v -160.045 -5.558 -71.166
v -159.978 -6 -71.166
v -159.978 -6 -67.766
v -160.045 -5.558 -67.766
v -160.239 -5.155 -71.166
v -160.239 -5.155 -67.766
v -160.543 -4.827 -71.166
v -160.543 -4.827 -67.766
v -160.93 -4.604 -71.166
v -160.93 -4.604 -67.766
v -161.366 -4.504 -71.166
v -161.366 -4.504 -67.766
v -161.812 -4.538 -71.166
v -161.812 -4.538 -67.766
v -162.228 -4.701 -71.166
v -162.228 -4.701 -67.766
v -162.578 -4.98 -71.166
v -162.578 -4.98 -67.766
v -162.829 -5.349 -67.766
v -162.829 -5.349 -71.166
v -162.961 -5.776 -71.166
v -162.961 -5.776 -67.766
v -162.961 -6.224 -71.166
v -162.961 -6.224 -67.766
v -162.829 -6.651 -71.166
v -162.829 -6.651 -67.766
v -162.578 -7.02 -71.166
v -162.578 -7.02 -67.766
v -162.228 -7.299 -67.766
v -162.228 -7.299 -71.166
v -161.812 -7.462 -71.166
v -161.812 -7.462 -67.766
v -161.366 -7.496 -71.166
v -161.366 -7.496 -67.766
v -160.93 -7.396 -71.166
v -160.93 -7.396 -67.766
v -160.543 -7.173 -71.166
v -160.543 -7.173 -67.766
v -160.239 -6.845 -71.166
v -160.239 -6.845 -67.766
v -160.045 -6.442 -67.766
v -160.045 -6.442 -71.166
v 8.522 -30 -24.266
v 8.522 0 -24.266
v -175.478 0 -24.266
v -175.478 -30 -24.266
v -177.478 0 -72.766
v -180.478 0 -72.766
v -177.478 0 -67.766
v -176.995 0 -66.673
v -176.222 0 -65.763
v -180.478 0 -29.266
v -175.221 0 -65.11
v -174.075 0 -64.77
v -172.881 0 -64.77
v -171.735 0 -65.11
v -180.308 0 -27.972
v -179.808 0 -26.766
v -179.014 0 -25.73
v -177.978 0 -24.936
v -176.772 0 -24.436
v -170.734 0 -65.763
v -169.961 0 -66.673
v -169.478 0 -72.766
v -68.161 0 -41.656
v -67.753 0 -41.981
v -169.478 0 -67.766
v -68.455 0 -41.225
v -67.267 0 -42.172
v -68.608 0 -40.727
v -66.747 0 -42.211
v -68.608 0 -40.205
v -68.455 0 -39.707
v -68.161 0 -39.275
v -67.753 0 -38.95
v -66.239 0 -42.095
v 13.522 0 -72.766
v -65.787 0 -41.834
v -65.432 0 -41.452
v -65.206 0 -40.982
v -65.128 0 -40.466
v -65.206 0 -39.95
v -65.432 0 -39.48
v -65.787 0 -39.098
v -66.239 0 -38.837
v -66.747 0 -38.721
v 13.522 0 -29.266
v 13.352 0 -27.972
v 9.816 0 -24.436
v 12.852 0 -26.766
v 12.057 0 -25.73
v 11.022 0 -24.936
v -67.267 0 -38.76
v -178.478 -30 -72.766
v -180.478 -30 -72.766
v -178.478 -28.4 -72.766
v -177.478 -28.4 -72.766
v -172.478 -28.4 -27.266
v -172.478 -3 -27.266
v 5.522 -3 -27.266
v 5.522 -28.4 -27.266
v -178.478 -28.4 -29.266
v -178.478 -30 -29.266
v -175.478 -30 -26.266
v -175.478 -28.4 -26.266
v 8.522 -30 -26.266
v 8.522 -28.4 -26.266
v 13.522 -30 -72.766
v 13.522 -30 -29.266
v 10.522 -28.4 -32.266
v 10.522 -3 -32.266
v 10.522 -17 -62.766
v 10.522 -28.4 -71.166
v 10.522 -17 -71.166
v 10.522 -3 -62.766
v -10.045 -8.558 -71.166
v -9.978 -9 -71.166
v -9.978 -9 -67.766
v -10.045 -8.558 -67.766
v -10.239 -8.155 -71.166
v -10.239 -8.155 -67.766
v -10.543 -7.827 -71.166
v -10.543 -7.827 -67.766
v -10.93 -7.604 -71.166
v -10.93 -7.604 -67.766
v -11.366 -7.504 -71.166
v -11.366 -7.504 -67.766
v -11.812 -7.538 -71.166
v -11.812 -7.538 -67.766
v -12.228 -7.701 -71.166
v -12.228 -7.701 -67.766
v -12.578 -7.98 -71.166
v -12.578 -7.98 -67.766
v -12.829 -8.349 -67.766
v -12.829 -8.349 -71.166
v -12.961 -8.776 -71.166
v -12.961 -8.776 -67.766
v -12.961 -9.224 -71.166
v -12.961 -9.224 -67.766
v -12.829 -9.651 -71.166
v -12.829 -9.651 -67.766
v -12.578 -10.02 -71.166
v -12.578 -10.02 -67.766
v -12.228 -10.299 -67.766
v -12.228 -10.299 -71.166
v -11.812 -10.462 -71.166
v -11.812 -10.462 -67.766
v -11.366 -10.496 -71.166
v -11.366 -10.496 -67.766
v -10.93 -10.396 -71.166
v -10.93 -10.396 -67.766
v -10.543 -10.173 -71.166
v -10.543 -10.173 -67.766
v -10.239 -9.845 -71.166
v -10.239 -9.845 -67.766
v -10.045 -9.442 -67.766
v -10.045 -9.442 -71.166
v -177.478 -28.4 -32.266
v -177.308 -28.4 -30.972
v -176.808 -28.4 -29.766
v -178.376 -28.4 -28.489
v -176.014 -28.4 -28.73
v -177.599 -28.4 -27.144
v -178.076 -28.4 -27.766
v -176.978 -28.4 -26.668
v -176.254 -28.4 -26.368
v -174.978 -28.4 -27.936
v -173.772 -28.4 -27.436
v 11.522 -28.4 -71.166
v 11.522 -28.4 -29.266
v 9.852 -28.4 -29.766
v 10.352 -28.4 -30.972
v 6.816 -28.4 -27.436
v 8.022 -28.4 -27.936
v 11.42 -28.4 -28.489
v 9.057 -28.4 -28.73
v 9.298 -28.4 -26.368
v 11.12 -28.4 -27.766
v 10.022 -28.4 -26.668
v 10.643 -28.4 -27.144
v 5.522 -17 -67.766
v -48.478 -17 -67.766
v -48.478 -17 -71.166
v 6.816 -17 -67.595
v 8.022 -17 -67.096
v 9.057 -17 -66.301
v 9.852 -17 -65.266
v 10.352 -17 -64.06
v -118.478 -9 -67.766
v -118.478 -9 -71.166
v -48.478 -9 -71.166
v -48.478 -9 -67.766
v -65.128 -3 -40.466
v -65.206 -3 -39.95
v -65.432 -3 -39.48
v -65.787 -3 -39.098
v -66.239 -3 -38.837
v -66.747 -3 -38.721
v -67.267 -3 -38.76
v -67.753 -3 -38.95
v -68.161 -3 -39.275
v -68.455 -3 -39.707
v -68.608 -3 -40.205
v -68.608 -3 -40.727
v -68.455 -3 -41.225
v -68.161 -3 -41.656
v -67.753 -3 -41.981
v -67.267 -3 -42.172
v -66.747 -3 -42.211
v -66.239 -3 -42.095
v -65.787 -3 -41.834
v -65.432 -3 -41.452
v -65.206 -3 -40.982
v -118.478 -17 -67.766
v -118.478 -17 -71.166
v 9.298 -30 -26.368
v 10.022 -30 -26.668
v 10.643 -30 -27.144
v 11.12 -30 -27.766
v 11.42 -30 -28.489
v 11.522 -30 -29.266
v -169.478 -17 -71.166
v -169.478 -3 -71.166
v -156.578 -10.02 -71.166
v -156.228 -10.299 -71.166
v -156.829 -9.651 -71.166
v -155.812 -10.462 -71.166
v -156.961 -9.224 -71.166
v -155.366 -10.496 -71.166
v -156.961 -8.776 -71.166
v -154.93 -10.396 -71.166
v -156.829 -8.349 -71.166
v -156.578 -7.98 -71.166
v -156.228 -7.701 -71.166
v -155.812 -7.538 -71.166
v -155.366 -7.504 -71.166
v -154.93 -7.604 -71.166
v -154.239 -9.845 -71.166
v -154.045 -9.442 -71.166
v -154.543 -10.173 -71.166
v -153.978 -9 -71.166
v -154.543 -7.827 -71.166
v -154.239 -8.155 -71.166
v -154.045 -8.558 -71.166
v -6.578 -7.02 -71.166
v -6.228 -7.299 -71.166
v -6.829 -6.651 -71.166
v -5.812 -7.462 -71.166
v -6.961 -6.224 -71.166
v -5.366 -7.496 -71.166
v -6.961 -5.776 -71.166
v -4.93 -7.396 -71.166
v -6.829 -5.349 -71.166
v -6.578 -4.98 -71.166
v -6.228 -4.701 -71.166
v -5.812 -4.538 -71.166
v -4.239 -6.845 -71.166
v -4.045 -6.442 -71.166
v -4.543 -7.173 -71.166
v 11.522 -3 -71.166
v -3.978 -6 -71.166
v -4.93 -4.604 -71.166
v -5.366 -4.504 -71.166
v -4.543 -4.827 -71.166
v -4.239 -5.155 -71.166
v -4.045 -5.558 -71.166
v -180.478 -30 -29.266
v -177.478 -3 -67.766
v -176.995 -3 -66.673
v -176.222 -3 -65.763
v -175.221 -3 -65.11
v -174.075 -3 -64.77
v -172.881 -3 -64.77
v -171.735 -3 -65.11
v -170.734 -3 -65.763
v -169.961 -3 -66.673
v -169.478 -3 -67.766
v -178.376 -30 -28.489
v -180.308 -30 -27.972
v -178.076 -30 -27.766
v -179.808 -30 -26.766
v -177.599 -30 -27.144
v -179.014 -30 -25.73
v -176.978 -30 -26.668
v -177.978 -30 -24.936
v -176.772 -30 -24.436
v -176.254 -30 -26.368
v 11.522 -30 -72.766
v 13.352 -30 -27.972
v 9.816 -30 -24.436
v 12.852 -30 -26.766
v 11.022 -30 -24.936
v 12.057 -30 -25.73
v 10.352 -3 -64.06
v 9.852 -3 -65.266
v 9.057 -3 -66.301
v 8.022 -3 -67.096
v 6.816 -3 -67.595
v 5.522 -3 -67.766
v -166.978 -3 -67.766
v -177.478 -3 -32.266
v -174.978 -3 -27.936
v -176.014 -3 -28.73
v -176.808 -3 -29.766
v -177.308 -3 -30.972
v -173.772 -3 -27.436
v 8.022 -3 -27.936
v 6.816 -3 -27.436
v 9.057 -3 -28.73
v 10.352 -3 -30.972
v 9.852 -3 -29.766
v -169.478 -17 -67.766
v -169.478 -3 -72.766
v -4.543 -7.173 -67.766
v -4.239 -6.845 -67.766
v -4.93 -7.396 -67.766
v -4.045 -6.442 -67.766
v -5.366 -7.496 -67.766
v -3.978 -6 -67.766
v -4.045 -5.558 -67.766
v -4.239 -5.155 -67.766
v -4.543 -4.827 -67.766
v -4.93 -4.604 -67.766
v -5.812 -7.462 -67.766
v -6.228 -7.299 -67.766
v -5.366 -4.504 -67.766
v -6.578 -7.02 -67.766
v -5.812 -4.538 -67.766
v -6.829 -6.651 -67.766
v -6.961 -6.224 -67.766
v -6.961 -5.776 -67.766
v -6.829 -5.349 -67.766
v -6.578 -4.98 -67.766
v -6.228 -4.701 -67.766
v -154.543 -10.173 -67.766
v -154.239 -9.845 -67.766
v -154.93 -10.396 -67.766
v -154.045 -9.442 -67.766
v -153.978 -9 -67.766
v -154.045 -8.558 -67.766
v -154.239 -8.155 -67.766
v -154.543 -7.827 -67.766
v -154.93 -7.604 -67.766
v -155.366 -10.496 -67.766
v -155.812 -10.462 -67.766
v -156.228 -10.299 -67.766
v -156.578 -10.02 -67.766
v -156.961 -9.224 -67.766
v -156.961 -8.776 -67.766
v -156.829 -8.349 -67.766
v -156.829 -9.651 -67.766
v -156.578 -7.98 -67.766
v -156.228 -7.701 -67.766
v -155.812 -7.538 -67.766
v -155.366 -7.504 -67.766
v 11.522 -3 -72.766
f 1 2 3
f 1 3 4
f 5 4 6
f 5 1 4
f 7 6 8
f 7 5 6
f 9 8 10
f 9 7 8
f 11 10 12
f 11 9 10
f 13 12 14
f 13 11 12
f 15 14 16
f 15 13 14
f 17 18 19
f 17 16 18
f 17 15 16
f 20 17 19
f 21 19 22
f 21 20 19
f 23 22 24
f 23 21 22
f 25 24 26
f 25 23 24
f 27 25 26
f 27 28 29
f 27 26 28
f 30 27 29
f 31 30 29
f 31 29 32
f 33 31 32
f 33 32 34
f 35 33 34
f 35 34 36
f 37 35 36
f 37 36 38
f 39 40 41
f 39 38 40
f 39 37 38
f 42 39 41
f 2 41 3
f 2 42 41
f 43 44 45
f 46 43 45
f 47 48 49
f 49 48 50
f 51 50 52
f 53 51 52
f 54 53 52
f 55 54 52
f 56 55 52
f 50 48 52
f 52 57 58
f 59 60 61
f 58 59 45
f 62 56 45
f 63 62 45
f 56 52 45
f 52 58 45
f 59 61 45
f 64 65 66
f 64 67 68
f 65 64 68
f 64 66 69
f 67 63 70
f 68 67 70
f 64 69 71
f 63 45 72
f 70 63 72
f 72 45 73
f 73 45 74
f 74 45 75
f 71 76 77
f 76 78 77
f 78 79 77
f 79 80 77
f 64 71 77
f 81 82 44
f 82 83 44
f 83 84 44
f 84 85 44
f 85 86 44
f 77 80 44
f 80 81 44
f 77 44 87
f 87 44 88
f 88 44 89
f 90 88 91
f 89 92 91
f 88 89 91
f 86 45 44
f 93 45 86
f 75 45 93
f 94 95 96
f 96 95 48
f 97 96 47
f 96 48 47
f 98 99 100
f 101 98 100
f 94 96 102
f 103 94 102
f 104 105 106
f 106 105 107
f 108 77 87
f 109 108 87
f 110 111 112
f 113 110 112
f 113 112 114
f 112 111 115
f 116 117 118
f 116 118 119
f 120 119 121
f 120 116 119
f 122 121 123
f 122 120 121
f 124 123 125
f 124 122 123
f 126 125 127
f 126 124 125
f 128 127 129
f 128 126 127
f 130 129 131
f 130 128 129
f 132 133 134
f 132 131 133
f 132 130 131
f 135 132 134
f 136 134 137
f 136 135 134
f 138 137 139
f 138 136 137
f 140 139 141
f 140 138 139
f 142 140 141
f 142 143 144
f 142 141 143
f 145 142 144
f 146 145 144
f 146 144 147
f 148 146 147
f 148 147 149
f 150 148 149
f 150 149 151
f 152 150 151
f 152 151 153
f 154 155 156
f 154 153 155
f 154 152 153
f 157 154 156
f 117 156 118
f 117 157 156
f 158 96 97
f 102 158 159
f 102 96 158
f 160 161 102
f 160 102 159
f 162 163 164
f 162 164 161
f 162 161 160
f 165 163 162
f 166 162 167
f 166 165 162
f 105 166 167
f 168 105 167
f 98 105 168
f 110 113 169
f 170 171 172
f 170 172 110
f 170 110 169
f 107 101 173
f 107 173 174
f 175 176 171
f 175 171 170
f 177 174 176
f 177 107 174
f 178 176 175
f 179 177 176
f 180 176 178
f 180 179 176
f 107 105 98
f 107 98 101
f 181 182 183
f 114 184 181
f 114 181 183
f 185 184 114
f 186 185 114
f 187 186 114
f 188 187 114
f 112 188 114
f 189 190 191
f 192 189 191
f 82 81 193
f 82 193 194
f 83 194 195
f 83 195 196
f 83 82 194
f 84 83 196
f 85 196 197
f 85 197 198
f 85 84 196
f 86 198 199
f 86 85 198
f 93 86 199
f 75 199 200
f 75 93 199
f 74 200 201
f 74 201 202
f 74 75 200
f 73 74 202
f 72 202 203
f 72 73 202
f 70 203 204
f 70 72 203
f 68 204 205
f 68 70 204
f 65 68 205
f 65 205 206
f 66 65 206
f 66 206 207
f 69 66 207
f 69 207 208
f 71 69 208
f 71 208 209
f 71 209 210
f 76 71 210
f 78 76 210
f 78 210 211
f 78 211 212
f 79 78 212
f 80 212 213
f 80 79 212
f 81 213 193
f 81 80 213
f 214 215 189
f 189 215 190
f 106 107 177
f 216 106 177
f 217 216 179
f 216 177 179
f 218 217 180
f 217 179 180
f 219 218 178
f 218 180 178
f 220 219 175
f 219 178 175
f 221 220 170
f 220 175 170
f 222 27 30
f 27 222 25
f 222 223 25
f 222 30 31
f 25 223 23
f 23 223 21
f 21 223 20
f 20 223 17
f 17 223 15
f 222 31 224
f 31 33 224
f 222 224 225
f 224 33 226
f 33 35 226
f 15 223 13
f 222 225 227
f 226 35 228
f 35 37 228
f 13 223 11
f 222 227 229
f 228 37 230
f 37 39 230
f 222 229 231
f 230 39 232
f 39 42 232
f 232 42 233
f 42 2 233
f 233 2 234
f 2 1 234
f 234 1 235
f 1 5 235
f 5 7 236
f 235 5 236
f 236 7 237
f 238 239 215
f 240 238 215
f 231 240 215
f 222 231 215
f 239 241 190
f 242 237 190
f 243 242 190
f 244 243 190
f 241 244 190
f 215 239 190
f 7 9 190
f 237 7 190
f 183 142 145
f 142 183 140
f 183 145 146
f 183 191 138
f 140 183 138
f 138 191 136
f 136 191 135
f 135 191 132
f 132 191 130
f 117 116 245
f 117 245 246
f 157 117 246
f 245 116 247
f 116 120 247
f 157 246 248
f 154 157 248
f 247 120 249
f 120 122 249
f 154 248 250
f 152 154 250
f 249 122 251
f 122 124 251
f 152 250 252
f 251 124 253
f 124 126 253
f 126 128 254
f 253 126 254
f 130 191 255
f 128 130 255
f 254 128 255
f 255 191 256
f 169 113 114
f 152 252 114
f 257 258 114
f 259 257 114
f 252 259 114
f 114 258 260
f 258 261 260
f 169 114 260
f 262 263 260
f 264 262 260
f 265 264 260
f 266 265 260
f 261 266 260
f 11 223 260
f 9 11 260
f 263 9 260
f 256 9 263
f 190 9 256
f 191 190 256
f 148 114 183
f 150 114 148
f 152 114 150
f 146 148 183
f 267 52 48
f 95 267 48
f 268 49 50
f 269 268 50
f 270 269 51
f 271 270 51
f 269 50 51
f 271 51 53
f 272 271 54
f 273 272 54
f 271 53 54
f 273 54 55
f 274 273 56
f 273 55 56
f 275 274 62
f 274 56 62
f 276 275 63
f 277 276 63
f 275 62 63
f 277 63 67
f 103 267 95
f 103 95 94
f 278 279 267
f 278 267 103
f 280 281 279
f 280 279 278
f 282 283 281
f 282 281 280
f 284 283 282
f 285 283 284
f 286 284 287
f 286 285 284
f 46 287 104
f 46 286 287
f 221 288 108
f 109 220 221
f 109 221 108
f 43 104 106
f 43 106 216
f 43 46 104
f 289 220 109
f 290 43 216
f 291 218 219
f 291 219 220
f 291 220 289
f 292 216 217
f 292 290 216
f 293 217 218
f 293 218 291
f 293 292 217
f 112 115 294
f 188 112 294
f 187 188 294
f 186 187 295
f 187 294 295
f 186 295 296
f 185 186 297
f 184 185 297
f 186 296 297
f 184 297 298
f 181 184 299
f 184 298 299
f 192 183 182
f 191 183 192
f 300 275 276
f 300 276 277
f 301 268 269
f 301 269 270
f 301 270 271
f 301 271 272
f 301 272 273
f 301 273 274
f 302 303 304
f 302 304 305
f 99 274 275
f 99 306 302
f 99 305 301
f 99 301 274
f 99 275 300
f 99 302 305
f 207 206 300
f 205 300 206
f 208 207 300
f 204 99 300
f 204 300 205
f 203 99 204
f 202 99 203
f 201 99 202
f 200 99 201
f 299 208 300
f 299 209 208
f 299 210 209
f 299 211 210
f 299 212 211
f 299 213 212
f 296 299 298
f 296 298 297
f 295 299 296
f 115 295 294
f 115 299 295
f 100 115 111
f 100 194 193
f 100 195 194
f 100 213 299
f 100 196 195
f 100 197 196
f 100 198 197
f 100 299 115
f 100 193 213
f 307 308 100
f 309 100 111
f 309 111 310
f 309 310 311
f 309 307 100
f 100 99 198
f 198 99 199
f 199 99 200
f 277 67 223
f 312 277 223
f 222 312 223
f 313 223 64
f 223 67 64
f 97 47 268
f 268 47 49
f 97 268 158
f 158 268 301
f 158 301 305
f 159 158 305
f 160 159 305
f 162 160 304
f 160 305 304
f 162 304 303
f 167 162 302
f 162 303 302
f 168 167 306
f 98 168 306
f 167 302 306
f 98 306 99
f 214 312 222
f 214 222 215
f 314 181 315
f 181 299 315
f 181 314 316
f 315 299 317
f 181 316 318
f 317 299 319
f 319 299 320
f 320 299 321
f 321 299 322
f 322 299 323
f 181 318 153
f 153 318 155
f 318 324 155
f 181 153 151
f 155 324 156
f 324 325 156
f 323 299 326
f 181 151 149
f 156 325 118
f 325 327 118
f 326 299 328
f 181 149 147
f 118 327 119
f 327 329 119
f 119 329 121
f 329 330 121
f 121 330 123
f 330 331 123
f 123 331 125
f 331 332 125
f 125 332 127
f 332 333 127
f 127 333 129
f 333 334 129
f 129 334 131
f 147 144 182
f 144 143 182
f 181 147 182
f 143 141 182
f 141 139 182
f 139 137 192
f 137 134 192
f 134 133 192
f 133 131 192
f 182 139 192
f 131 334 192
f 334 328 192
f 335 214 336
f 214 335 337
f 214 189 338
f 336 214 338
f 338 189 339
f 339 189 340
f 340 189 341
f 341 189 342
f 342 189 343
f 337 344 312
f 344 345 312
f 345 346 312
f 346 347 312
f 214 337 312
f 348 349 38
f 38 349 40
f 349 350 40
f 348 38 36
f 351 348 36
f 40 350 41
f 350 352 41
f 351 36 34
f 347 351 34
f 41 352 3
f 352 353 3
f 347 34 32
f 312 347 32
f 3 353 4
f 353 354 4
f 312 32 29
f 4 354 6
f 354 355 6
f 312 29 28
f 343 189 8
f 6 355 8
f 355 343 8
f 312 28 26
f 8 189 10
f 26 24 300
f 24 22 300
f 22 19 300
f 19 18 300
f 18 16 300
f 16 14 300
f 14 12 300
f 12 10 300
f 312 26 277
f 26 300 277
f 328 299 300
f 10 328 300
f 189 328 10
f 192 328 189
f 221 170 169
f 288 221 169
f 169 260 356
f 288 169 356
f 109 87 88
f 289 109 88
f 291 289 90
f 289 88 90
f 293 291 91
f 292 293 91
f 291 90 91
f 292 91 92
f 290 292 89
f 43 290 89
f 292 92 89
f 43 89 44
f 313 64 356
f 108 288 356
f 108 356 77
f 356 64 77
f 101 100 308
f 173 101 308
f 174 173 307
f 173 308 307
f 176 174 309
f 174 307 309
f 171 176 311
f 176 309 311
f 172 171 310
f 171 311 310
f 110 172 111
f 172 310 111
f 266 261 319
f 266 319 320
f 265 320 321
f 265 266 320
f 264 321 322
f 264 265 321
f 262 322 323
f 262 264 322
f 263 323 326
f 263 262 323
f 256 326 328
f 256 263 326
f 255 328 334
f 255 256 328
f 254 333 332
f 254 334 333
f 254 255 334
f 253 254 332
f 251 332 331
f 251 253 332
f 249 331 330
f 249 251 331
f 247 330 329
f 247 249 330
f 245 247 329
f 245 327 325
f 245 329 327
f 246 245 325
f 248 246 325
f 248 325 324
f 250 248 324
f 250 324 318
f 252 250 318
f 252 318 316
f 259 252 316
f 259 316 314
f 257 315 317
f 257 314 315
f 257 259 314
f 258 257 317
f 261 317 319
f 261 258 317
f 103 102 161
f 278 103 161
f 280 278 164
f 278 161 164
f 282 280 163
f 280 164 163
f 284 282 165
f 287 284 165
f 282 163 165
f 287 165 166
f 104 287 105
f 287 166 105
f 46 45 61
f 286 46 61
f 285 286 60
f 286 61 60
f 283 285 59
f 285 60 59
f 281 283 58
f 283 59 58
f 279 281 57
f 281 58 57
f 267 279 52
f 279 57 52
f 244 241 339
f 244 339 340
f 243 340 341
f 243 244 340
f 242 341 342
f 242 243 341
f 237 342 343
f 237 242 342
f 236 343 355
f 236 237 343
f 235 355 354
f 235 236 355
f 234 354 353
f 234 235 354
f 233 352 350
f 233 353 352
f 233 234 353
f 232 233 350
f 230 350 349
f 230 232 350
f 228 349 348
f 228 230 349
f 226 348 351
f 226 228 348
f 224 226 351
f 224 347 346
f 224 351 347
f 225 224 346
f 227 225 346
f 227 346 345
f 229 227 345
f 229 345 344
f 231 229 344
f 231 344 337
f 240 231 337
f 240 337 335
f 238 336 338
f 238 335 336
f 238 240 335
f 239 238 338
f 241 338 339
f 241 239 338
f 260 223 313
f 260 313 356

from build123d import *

# Parameters (mm, degrees)
F1_DEPTH = 30
F2_DEPTH = 28.4
F0_W     = 2.5
F0_H     = 3.4
F0_W_2   = 3
F0_W_3   = 7
F0_W_4   = 35.5
F0_W_5   = 70
F3_DEPTH = 17
F0_R     = 1.75
F4_DEPTH = 3
F6_DEPTH = 25
F7_R     = 1.5
F7_W     = 70
F7_H     = 13.8912867606
F8_DEPTH = 25


# Not quite as in the source:
# - ends of sketch curves that miss each other by under 0.0002 mm in the source are joined


with BuildPart() as f1:
    # F0 (on Front) → F1 (new body)
    with BuildSketch(Plane.XZ):
        with BuildLine():
            Line((-180.478038, -29.2658), (-180.478038, -72.7658))
            Line((-180.478038, -72.7658), (-178.478038, -72.7658))
            Line((-178.478038, -72.7658), (-178.478038, -29.2658))
            ThreePointArc((-178.478038, -29.2658), (-177.5993583436, -27.1444796564), (-175.478038, -26.2658))
            Line((-175.478038, -26.2658), (8.521962, -26.2658))
            ThreePointArc((8.521962, -26.2658), (10.6432823436, -27.1444796564), (11.521962, -29.2658))
            Line((11.521962, -29.2658), (11.521962, -71.1658))
            Line((11.521962, -71.1658), (11.521962, -72.7658))
            Line((11.521962, -72.7658), (13.521962, -72.7658))
            Line((13.521962, -72.7658), (13.521962, -29.2658))
            ThreePointArc((13.521962, -29.2658), (12.0574959059, -25.7302660941), (8.521962, -24.2658))
            Line((8.521962, -24.2658), (-175.478038, -24.2658))
            ThreePointArc((-175.478038, -24.2658), (-179.0135719059, -25.7302660941), (-180.478038, -29.2658))
        make_face()
    extrude(amount=F1_DEPTH)

    # F0 (on Front) → F2 (join)
    with BuildSketch(Plane.XZ):
        with BuildLine():
            Line((-178.478038, -29.2658), (-178.478038, -72.7658))
            Line((-178.478038, -72.7658), (-177.478038, -72.7658))
            Line((-177.478038, -72.7658), (-177.478038, -67.7658000352))
            Line((-177.478038, -67.7658000352), (-177.478038, -32.2658))
            ThreePointArc((-177.478038, -32.2658), (-176.0135719059, -28.7302660941), (-172.478038, -27.2658))
            Line((-172.478038, -27.2658), (5.521962, -27.2658))
            ThreePointArc((5.521962, -27.2658), (9.0574959059, -28.7302660941), (10.521962, -32.2658))
            Line((10.521962, -32.2658), (10.521962, -62.7658))
            Line((10.521962, -62.7658), (10.521962, -71.1658))
            Line((10.521962, -71.1658), (11.521962, -71.1658))
            Line((11.521962, -71.1658), (11.521962, -29.2658))
            ThreePointArc((11.521962, -29.2658), (10.6432823436, -27.1444796564), (8.521962, -26.2658))
            Line((8.521962, -26.2658), (-175.478038, -26.2658))
            ThreePointArc((-175.478038, -26.2658), (-177.5993583436, -27.1444796564), (-178.478038, -29.2658))
        make_face()
    extrude(amount=F2_DEPTH)

    # F0 (on Front) → F3 (join)
    with BuildSketch(Plane.XZ):
        with Locations((-168.228038, -69.4658)):
            Rectangle(F0_W, F0_H)
        with Locations((-165.478038, -69.4658)):
            Rectangle(F0_W_2, F0_H)
        with Locations((-160.478038, -69.4658)):
            Rectangle(F0_W_3, F0_H)
        with Locations((-155.478038, -69.4658)):
            Rectangle(F0_W_2, F0_H)
        with Locations((-136.228038, -69.4658)):
            Rectangle(F0_W_4, F0_H)
        with Locations((-83.478038, -69.4658)):
            Rectangle(F0_W_5, F0_H)
        with Locations((-30.728038, -69.4658)):
            Rectangle(F0_W_4, F0_H)
        with Locations((-11.478038, -69.4658)):
            Rectangle(F0_W_2, F0_H)
        with Locations((-6.478038, -69.4658)):
            Rectangle(F0_W_3, F0_H)
        with Locations((-1.478038, -69.4658)):
            Rectangle(F0_W_2, F0_H)
        with BuildLine():
            Line((0.021962, -71.1658), (10.521962, -71.1658))
            Line((10.521962, -71.1658), (10.521962, -62.7658))
            ThreePointArc((10.521962, -62.7658), (9.0574959059, -66.3013339059), (5.521962, -67.7658))
            Line((5.521962, -67.7658), (0.021962, -67.7658))
            Line((0.021962, -67.7658), (0.021962, -71.1658))
        make_face()
    extrude(amount=F3_DEPTH)

    # F0 (on Front) → F4 (join)
    with BuildSketch(Plane.XZ):
        Polygon((-166.978038, -71.1658), (-169.478038, -71.1658), (-169.478038, -72.7658), (11.521962, -72.7658), (11.521962, -71.1658), (10.521962, -71.1658), (0.021962, -71.1658), (-2.978038, -71.1658), (-9.978038, -71.1658), (-12.978038, -71.1658), (-48.478038, -71.1658), (-118.478038, -71.1658), (-153.978038, -71.1658), (-156.978038, -71.1658), (-163.978038, -71.1658), align=None)
        with BuildLine():
            Line((-177.478038, -32.2658), (-177.478038, -67.7658000352))
            ThreePointArc((-177.478038, -67.7658000352), (-173.478038, -64.726809), (-169.4780381264, -67.7658000352))
            Line((-169.4780381264, -67.7658000352), (-166.978038, -67.7658))
            Line((-166.978038, -67.7658), (-163.978038, -67.7658))
            Line((-163.978038, -67.7658), (-156.978038, -67.7658))
            Line((-156.978038, -67.7658), (-153.978038, -67.7658))
            Line((-153.978038, -67.7658), (-118.478038, -67.7658))
            Line((-118.478038, -67.7658), (-48.478038, -67.7658))
            Line((-48.478038, -67.7658), (-12.978038, -67.7658))
            Line((-12.978038, -67.7658), (-9.978038, -67.7658))
            Line((-9.978038, -67.7658), (-2.978038, -67.7658))
            Line((-2.978038, -67.7658), (0.021962, -67.7658))
            Line((0.021962, -67.7658), (5.521962, -67.7658))
            ThreePointArc((5.521962, -67.7658), (9.0574959059, -66.3013339059), (10.521962, -62.7658))
            Line((10.521962, -62.7658), (10.521962, -32.2658))
            ThreePointArc((10.521962, -32.2658), (9.0574959059, -28.7302660941), (5.521962, -27.2658))
            Line((5.521962, -27.2658), (-172.478038, -27.2658))
            ThreePointArc((-172.478038, -27.2658), (-176.0135719059, -28.7302660941), (-177.478038, -32.2658))
        make_face()
        with Locations((-66.878038, -40.4658)):
            Circle(F0_R, mode=Mode.SUBTRACT)
    extrude(amount=F4_DEPTH)

    # F7 (on offset) → F8 (cut)
    with BuildSketch(Plane.XY.offset(-75)):
        with Locations((-11.478038, -9)):
            Circle(F7_R)
        with Locations((-5.478038, -6)):
            Circle(F7_R)
        with Locations((-83.478038, -15.9456433803)):
            Rectangle(F7_W, F7_H)
        with Locations((-161.478038, -6)):
            Circle(F7_R)
        with Locations((-155.478038, -9)):
            Circle(F7_R)
    extrude(amount=F8_DEPTH, mode=Mode.SUBTRACT)


with BuildPart() as f6:
    # F0 (on Front) → F6 (new body)
    with BuildSketch(Plane.XZ):
        Polygon((-177.478038, 13.4356050125), (-177.478038, 12.671673), (-169.478038, 12.671673), (-169.478038, 27.071673), (-118.478038, 27.071673), (-118.478038, 19.571673), (-48.478038, 19.571673), (-48.478038, 27.071673), (10.521962, 27.071673), (10.521962, 38.071673), (-177.478038, 38.071673), (-177.478038, 33.071673), align=None)
    extrude(amount=F6_DEPTH)


solid = f1.part
